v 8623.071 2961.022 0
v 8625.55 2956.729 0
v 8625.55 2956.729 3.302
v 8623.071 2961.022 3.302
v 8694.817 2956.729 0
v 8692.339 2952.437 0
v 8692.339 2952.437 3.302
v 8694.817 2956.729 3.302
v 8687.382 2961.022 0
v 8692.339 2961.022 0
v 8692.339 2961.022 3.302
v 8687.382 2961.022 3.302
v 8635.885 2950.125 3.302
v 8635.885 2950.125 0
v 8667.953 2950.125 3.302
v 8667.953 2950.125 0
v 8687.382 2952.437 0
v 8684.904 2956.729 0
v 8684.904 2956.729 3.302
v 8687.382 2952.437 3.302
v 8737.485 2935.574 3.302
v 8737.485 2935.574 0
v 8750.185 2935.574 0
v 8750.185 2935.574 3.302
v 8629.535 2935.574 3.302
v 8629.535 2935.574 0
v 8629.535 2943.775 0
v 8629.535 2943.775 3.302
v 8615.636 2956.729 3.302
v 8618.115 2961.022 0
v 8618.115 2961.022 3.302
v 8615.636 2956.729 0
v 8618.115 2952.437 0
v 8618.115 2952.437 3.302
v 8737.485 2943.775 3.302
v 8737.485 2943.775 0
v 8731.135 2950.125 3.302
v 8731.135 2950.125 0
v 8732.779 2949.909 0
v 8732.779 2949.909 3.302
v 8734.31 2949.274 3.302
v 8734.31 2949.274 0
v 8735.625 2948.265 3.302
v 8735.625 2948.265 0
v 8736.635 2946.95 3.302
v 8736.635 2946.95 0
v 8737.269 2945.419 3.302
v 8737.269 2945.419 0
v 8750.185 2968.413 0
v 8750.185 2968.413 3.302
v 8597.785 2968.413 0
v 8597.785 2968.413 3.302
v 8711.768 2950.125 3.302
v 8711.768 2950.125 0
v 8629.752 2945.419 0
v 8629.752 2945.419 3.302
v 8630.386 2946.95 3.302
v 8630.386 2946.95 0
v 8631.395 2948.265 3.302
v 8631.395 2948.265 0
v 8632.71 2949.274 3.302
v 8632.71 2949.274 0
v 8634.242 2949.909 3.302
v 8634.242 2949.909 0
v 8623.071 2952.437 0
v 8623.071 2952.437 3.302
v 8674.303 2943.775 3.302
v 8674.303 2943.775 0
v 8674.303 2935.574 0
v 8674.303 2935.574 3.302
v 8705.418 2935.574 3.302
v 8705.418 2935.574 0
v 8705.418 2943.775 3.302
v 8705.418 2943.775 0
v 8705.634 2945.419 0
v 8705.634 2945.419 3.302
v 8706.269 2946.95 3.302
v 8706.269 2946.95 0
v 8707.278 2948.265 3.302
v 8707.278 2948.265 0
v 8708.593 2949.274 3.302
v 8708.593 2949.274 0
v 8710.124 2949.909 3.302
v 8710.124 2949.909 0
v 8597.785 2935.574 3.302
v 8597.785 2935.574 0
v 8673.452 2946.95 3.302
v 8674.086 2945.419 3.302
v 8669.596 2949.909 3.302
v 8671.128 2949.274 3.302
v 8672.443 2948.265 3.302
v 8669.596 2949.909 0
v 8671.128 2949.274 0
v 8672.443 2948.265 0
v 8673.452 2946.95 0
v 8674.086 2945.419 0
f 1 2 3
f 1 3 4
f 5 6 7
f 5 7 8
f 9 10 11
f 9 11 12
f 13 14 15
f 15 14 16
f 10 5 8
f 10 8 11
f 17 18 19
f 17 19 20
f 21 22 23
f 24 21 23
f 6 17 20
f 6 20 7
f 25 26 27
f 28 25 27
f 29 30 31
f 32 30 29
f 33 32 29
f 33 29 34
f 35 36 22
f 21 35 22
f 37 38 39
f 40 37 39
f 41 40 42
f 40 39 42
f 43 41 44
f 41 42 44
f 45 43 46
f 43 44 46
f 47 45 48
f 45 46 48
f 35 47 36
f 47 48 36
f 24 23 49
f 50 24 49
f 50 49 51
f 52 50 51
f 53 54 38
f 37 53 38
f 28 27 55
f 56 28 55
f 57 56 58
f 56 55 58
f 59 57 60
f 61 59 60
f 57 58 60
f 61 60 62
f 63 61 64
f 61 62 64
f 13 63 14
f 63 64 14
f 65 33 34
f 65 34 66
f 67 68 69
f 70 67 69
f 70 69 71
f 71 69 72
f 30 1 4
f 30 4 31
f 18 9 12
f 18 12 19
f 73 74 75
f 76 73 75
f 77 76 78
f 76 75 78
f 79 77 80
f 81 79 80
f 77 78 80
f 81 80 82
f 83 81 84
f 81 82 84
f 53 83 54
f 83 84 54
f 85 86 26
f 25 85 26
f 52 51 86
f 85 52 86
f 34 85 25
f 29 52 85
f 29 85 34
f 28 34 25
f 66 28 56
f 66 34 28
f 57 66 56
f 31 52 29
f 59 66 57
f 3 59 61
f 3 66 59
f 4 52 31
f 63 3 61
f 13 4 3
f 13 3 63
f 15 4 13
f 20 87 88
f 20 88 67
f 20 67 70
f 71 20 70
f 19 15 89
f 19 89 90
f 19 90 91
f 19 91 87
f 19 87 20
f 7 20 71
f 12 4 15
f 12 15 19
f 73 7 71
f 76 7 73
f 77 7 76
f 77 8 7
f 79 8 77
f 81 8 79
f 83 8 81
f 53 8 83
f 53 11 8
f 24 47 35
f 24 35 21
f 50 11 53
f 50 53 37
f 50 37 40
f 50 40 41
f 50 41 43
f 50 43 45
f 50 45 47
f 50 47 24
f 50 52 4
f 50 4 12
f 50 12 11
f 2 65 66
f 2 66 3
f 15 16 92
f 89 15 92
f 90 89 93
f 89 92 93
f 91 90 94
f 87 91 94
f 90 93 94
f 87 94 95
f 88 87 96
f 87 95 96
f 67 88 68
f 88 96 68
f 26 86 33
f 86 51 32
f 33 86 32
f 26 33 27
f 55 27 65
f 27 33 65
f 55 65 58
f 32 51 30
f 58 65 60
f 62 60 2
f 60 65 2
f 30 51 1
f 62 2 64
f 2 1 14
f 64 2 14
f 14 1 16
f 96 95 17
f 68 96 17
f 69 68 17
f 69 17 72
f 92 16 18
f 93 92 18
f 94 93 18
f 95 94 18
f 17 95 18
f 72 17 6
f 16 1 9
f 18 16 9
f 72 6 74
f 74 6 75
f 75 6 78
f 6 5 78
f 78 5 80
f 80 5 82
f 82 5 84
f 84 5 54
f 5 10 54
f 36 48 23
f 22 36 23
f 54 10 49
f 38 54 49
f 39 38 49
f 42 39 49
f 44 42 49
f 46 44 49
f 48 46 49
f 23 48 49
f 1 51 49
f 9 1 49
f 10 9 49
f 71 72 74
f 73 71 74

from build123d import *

# Parameters (mm, degrees)
BOSS_EXTRUDE1_DEPTH = 3.302


with BuildPart() as part:
    # Sketch1 → Boss-Extrude1 (new body)
    with BuildSketch(Plane.XY):
        with BuildLine():
            Line((8750.18528935, 2968.413177756), (8597.78528935, 2968.413177756))
            Line((8597.78528935, 2968.413177756), (8597.78528935, 2935.573517756))
            Line((8597.78528935, 2935.573517756), (8629.53528935, 2935.573517756))
            Line((8629.53528935, 2935.573517756), (8629.53528935, 2943.775177756))
            ThreePointArc((8629.53528935, 2943.775177756), (8631.39516129, 2948.265305817), (8635.88528935, 2950.125177756))
            Line((8635.88528935, 2950.125177756), (8667.95278935, 2950.125177756))
            ThreePointArc((8667.95278935, 2950.125177756), (8672.442917411, 2948.265305817), (8674.30278935, 2943.775177756))
            Line((8674.30278935, 2943.775177756), (8674.30278935, 2935.573517756))
            Line((8674.30278935, 2935.573517756), (8705.41778935, 2935.573517756))
            Line((8705.41778935, 2935.573517756), (8705.41778935, 2943.775177756))
            ThreePointArc((8705.41778935, 2943.775177756), (8707.27766129, 2948.265305817), (8711.76778935, 2950.125177756))
            Line((8711.76778935, 2950.125177756), (8731.13528935, 2950.125177756))
            ThreePointArc((8731.13528935, 2950.125177756), (8735.625417411, 2948.265305817), (8737.48528935, 2943.775177756))
            Line((8737.48528935, 2943.775177756), (8737.48528935, 2935.573517756))
            Line((8737.48528935, 2935.573517756), (8750.18528935, 2935.573517756))
            Line((8750.18528935, 2935.573517756), (8750.18528935, 2968.413177756))
        make_face()
        Polygon((8618.114658264, 2961.021777756), (8615.636324499, 2956.729177756), (8618.114658264, 2952.436577756), (8623.071325795, 2952.436577756), (8625.549659561, 2956.729177756), (8623.071325795, 2961.021777756), align=None, mode=Mode.SUBTRACT)
        Polygon((8687.381955585, 2961.021777756), (8684.903621819, 2956.729177756), (8687.381955585, 2952.436577756), (8692.338623116, 2952.436577756), (8694.816956881, 2956.729177756), (8692.338623116, 2961.021777756), align=None, mode=Mode.SUBTRACT)
    extrude(amount=BOSS_EXTRUDE1_DEPTH)


solid = part.part
